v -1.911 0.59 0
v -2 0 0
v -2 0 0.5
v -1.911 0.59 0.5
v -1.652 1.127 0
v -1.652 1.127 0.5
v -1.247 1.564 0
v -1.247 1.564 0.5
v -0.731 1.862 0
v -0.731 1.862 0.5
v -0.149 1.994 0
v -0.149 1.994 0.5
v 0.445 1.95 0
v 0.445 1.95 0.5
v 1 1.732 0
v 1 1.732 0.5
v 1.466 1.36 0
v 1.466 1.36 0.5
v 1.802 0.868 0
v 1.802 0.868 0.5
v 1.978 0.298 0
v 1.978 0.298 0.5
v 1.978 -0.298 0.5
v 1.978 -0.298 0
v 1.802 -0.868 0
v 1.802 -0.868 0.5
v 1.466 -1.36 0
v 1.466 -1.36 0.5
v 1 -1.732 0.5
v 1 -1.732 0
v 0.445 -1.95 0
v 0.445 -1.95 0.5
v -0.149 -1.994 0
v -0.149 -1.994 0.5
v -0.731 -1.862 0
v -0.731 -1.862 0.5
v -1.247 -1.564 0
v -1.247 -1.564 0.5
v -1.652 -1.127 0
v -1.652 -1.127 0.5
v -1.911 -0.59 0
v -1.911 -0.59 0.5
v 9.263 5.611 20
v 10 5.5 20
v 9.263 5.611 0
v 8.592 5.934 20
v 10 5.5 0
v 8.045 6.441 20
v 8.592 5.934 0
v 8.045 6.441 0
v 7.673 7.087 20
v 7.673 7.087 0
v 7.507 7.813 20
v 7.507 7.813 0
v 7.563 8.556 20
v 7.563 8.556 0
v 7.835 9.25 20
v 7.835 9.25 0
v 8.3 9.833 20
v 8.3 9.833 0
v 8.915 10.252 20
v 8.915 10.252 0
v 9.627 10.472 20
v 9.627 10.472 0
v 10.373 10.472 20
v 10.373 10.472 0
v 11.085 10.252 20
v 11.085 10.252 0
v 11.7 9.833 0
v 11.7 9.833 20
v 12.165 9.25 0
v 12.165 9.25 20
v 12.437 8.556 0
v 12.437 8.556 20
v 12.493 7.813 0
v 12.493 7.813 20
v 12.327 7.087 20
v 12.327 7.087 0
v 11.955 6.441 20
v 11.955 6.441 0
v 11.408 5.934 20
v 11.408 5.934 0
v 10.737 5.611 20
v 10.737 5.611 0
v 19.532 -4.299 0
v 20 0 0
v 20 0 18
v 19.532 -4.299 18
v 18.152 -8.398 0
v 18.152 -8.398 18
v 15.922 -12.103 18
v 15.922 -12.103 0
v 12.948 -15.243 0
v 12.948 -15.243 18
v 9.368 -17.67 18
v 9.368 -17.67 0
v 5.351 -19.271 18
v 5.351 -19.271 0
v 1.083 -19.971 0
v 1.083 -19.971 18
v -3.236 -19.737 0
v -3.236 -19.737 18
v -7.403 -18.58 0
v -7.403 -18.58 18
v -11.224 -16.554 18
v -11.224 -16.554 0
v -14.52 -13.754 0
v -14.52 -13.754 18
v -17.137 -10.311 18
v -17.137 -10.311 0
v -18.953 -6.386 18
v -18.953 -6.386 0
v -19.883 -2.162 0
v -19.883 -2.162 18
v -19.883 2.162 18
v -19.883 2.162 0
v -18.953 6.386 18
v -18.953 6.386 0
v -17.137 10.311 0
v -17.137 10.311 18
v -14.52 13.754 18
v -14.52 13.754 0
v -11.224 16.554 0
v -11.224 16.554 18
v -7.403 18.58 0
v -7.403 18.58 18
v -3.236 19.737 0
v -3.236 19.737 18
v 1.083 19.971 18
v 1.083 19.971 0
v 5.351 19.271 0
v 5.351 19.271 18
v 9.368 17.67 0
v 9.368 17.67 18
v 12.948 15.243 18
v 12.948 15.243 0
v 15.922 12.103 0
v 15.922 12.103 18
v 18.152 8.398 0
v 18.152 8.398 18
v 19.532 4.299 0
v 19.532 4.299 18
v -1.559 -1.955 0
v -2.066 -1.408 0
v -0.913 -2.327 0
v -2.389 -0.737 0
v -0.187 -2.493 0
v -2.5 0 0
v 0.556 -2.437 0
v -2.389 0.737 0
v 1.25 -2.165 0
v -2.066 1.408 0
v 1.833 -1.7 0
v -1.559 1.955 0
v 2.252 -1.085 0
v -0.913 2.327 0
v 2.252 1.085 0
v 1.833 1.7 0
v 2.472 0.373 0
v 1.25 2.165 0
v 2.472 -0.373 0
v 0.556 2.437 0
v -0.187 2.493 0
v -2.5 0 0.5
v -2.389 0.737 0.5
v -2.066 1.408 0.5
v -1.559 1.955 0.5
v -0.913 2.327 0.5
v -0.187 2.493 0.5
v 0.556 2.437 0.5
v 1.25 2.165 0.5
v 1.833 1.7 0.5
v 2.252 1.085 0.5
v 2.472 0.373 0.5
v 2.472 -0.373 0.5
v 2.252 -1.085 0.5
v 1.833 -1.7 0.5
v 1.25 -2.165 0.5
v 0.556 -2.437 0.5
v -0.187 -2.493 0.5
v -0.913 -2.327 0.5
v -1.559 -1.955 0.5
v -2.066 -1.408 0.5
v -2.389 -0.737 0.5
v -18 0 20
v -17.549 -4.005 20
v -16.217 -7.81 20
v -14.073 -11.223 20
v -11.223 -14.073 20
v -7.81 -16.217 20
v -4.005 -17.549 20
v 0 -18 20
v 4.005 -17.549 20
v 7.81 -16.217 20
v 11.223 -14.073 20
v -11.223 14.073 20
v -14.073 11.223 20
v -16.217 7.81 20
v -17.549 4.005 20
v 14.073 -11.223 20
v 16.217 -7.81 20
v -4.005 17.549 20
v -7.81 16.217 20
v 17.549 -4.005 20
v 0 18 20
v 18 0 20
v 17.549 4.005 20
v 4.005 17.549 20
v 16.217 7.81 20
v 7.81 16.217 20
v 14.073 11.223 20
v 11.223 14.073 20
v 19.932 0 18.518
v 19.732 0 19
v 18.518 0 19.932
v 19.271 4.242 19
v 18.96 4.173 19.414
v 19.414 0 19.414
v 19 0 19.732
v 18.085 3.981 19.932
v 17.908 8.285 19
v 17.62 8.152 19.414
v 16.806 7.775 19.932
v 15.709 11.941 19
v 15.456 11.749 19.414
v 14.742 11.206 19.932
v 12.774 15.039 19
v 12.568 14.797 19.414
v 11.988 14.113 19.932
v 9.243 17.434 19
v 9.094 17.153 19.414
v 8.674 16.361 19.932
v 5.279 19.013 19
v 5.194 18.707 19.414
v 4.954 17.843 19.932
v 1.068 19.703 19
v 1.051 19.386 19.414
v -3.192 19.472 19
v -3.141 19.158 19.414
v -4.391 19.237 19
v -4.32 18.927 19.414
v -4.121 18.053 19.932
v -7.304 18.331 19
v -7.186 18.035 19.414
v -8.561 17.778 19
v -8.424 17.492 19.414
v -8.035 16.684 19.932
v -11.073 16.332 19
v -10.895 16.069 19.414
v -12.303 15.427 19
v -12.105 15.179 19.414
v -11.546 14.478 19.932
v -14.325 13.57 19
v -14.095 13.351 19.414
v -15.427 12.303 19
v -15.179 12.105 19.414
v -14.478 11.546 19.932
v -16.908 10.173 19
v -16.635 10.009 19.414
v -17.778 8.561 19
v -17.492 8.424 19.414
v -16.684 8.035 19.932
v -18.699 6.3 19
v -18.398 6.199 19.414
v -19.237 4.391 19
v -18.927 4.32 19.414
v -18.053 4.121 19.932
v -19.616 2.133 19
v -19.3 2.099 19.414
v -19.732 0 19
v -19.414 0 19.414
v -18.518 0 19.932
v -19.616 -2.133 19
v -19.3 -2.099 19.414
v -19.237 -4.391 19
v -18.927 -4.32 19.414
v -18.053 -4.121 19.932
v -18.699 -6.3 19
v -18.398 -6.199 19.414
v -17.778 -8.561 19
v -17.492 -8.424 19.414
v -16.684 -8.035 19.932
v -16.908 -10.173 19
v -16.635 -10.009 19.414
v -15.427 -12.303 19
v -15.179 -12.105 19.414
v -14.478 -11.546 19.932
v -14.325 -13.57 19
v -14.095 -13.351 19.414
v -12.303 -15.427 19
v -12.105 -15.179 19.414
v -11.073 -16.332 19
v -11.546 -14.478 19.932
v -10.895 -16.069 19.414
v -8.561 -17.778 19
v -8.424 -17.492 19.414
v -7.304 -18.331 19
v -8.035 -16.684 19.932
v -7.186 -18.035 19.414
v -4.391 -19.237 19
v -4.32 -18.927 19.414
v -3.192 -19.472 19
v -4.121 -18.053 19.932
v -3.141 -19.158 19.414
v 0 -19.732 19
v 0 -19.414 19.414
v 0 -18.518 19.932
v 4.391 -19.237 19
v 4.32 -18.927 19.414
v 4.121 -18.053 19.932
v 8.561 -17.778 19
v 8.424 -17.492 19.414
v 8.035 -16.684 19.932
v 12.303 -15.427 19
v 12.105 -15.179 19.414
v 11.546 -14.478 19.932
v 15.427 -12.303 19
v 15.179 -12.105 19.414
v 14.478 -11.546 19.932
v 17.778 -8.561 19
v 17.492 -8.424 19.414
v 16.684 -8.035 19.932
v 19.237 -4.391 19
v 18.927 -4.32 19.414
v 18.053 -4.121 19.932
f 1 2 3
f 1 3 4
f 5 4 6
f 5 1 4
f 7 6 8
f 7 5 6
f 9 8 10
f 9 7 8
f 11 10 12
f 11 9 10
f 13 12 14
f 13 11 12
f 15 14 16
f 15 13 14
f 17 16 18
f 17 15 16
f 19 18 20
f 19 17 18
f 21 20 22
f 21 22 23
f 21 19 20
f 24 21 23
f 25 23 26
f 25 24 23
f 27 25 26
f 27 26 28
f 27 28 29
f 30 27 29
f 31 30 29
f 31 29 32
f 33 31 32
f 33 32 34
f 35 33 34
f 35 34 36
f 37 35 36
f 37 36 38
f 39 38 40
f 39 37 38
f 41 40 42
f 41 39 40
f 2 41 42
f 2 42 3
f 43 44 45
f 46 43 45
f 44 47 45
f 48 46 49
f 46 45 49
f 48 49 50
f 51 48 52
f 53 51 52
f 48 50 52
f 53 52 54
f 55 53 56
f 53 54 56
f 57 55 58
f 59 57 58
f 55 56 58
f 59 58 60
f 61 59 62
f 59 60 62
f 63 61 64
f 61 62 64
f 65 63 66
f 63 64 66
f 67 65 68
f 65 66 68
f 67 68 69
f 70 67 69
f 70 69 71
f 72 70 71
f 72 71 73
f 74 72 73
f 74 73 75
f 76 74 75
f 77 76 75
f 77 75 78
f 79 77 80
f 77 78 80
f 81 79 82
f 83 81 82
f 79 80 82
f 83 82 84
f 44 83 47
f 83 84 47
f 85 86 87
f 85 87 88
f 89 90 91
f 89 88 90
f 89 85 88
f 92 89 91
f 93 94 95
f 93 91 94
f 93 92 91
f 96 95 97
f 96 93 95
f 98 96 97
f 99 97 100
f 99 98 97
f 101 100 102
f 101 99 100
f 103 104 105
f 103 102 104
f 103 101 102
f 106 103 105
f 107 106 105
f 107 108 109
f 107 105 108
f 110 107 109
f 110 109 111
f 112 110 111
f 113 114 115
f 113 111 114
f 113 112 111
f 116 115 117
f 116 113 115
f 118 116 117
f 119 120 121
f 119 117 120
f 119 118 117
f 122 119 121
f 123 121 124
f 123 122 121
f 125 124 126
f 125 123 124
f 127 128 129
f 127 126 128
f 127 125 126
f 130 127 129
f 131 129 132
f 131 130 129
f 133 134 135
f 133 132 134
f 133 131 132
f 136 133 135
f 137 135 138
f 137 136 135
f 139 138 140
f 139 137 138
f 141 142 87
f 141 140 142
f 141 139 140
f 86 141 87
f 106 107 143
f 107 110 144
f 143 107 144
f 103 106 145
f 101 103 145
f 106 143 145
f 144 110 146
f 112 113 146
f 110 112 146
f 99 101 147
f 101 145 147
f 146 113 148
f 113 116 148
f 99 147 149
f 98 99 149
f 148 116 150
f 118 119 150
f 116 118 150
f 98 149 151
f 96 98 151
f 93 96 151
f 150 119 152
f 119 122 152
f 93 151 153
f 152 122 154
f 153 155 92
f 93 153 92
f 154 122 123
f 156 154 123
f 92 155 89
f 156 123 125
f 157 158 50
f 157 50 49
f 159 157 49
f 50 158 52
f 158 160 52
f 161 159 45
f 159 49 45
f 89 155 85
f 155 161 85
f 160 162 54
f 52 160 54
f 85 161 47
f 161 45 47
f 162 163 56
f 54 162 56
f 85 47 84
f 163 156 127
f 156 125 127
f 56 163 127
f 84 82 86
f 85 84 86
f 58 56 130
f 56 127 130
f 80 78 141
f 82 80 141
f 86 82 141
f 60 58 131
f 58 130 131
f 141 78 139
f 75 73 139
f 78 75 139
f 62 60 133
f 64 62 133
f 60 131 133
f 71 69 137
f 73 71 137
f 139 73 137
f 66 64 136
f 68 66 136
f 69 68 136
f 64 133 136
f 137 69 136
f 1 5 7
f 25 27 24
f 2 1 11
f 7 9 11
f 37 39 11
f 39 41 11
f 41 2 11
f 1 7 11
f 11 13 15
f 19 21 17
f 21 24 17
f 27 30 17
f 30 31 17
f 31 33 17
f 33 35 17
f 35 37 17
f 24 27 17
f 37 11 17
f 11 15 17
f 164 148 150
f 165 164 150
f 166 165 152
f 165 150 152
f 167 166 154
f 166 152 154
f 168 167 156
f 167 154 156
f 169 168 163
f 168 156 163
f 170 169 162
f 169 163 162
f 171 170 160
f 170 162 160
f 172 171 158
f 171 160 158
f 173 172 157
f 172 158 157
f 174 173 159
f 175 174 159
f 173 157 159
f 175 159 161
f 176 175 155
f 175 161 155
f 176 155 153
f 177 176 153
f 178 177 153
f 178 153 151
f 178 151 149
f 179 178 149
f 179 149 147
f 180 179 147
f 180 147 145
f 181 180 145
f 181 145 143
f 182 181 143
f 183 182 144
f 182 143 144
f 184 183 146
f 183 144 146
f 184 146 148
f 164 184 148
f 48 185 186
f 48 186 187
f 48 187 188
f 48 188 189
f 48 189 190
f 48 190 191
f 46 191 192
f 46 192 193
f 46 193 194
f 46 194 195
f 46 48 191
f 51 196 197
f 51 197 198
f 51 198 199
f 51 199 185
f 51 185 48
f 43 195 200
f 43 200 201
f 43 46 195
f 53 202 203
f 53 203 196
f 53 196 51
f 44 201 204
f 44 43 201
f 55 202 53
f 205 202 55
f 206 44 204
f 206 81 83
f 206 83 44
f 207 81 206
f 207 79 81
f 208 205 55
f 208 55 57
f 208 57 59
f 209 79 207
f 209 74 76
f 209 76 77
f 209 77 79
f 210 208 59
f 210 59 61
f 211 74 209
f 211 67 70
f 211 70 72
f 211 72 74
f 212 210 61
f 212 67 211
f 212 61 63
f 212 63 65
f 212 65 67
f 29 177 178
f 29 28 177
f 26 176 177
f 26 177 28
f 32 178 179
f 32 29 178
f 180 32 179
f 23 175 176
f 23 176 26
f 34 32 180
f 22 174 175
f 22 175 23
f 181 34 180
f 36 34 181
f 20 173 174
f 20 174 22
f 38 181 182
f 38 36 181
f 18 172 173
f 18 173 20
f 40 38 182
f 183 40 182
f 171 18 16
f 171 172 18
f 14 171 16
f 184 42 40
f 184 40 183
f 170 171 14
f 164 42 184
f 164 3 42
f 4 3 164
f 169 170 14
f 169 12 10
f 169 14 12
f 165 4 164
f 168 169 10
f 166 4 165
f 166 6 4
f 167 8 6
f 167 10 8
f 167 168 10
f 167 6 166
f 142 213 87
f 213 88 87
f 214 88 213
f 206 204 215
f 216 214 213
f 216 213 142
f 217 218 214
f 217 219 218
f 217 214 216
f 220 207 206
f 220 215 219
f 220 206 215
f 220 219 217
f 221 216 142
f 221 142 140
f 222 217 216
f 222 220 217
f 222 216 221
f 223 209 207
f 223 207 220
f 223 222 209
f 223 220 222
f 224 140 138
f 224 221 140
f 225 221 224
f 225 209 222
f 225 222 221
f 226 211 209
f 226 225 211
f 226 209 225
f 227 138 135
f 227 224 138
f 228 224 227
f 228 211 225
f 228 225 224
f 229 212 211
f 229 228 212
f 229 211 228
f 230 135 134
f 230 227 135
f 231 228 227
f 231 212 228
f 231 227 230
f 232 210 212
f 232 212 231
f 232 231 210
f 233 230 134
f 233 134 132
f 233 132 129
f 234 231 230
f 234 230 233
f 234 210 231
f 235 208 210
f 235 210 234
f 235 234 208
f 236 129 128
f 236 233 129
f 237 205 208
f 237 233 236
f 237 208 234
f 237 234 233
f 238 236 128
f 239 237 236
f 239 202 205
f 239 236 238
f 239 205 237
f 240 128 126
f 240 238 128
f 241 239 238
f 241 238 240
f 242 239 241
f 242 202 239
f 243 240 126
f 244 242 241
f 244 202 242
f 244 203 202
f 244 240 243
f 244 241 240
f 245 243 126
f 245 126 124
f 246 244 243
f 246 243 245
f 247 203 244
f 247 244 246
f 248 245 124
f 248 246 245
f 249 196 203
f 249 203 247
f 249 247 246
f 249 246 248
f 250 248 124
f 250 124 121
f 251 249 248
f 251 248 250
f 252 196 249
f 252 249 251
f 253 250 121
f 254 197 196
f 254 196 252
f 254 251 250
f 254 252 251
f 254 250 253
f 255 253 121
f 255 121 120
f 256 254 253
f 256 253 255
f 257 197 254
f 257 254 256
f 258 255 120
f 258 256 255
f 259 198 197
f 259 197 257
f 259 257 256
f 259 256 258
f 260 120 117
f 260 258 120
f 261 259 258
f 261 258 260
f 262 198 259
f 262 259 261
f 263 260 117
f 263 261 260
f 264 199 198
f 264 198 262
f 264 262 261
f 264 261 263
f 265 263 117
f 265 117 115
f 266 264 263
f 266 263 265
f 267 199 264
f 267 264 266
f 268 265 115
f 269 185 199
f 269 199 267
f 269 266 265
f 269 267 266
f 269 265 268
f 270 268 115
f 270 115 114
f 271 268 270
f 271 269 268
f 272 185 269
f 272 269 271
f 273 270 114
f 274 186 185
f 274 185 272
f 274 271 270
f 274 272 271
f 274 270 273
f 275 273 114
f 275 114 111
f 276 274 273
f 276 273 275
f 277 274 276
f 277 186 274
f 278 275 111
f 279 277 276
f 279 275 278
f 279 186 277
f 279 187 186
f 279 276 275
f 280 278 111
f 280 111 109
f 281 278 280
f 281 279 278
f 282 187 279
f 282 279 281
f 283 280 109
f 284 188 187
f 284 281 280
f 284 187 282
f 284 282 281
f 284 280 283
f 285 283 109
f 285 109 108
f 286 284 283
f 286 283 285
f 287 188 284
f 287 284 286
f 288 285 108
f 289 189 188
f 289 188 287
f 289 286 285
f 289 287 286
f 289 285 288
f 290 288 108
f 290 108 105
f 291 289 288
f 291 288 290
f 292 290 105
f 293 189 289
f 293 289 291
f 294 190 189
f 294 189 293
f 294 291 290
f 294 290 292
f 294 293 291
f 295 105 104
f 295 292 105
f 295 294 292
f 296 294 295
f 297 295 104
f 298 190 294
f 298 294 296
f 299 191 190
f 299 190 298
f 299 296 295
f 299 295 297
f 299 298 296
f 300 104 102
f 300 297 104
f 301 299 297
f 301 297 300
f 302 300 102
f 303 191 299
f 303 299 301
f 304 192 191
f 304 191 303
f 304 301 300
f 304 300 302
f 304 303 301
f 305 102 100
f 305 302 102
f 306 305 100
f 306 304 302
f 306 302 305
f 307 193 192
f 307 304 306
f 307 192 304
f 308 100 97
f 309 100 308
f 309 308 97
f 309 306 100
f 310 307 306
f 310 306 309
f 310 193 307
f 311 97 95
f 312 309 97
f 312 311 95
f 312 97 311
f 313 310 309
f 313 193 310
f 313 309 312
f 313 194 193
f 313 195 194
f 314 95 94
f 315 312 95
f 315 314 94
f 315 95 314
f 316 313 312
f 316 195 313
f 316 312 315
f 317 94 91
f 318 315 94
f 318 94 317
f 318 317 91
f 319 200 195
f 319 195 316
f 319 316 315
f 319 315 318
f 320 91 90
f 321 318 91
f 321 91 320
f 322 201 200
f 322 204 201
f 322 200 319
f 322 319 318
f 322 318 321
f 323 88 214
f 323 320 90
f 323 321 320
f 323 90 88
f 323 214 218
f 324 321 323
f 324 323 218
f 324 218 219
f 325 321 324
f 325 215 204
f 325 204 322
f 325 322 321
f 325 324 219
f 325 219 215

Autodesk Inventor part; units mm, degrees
ref_plane "YZ Plane" through (0, 0, 0) normal (1, 0, 0) x (0, 1, 0)
ref_plane "XZ Plane" through (0, 0, 0) normal (0, 1, 0) x (-1, 0, 0)
ref_plane "XY Plane" through (0, 0, 0) normal (0, 0, 1) x (1, 0, 0)
sketch "Skizze1" plane through (0, 0, 0) normal (0, 0, 1) x (1, 0, 0)
  circle A0 centre (0, 0) radius 20
  dimension "d0" = 40
extrude "Extrusion1" add sketch "Skizze1" along normal blind 20
fillet "Rundung1" radius 2 1 edges at (-20, 0, 20)
sketch "Skizze2" plane through (0, 0, 20) normal (0, 0, 1) x (1, 0, 0)
  circle A0 centre (10, 8) radius 3.75
  point P0 (0, 0)
  dimension "d4" = 7.5
hole "Bohrung1" at (10, 8, 20) direction (0, 0, -1) diameter 5 end through all
sketch "Skizze3" plane through (0, 0, 0) normal (0, 0, -1) x (-1, 0, 0)
  circle A0 centre (0, 0) radius 2.5
  circle A1 centre (0, 0) radius 2
  dimension "d12" = 5
  dimension "d13" = 4
extrude "Extrusion2" cut sketch "Skizze3" against normal blind 0.5
properties part number "Hub" material "ABS-Kunststoff"
